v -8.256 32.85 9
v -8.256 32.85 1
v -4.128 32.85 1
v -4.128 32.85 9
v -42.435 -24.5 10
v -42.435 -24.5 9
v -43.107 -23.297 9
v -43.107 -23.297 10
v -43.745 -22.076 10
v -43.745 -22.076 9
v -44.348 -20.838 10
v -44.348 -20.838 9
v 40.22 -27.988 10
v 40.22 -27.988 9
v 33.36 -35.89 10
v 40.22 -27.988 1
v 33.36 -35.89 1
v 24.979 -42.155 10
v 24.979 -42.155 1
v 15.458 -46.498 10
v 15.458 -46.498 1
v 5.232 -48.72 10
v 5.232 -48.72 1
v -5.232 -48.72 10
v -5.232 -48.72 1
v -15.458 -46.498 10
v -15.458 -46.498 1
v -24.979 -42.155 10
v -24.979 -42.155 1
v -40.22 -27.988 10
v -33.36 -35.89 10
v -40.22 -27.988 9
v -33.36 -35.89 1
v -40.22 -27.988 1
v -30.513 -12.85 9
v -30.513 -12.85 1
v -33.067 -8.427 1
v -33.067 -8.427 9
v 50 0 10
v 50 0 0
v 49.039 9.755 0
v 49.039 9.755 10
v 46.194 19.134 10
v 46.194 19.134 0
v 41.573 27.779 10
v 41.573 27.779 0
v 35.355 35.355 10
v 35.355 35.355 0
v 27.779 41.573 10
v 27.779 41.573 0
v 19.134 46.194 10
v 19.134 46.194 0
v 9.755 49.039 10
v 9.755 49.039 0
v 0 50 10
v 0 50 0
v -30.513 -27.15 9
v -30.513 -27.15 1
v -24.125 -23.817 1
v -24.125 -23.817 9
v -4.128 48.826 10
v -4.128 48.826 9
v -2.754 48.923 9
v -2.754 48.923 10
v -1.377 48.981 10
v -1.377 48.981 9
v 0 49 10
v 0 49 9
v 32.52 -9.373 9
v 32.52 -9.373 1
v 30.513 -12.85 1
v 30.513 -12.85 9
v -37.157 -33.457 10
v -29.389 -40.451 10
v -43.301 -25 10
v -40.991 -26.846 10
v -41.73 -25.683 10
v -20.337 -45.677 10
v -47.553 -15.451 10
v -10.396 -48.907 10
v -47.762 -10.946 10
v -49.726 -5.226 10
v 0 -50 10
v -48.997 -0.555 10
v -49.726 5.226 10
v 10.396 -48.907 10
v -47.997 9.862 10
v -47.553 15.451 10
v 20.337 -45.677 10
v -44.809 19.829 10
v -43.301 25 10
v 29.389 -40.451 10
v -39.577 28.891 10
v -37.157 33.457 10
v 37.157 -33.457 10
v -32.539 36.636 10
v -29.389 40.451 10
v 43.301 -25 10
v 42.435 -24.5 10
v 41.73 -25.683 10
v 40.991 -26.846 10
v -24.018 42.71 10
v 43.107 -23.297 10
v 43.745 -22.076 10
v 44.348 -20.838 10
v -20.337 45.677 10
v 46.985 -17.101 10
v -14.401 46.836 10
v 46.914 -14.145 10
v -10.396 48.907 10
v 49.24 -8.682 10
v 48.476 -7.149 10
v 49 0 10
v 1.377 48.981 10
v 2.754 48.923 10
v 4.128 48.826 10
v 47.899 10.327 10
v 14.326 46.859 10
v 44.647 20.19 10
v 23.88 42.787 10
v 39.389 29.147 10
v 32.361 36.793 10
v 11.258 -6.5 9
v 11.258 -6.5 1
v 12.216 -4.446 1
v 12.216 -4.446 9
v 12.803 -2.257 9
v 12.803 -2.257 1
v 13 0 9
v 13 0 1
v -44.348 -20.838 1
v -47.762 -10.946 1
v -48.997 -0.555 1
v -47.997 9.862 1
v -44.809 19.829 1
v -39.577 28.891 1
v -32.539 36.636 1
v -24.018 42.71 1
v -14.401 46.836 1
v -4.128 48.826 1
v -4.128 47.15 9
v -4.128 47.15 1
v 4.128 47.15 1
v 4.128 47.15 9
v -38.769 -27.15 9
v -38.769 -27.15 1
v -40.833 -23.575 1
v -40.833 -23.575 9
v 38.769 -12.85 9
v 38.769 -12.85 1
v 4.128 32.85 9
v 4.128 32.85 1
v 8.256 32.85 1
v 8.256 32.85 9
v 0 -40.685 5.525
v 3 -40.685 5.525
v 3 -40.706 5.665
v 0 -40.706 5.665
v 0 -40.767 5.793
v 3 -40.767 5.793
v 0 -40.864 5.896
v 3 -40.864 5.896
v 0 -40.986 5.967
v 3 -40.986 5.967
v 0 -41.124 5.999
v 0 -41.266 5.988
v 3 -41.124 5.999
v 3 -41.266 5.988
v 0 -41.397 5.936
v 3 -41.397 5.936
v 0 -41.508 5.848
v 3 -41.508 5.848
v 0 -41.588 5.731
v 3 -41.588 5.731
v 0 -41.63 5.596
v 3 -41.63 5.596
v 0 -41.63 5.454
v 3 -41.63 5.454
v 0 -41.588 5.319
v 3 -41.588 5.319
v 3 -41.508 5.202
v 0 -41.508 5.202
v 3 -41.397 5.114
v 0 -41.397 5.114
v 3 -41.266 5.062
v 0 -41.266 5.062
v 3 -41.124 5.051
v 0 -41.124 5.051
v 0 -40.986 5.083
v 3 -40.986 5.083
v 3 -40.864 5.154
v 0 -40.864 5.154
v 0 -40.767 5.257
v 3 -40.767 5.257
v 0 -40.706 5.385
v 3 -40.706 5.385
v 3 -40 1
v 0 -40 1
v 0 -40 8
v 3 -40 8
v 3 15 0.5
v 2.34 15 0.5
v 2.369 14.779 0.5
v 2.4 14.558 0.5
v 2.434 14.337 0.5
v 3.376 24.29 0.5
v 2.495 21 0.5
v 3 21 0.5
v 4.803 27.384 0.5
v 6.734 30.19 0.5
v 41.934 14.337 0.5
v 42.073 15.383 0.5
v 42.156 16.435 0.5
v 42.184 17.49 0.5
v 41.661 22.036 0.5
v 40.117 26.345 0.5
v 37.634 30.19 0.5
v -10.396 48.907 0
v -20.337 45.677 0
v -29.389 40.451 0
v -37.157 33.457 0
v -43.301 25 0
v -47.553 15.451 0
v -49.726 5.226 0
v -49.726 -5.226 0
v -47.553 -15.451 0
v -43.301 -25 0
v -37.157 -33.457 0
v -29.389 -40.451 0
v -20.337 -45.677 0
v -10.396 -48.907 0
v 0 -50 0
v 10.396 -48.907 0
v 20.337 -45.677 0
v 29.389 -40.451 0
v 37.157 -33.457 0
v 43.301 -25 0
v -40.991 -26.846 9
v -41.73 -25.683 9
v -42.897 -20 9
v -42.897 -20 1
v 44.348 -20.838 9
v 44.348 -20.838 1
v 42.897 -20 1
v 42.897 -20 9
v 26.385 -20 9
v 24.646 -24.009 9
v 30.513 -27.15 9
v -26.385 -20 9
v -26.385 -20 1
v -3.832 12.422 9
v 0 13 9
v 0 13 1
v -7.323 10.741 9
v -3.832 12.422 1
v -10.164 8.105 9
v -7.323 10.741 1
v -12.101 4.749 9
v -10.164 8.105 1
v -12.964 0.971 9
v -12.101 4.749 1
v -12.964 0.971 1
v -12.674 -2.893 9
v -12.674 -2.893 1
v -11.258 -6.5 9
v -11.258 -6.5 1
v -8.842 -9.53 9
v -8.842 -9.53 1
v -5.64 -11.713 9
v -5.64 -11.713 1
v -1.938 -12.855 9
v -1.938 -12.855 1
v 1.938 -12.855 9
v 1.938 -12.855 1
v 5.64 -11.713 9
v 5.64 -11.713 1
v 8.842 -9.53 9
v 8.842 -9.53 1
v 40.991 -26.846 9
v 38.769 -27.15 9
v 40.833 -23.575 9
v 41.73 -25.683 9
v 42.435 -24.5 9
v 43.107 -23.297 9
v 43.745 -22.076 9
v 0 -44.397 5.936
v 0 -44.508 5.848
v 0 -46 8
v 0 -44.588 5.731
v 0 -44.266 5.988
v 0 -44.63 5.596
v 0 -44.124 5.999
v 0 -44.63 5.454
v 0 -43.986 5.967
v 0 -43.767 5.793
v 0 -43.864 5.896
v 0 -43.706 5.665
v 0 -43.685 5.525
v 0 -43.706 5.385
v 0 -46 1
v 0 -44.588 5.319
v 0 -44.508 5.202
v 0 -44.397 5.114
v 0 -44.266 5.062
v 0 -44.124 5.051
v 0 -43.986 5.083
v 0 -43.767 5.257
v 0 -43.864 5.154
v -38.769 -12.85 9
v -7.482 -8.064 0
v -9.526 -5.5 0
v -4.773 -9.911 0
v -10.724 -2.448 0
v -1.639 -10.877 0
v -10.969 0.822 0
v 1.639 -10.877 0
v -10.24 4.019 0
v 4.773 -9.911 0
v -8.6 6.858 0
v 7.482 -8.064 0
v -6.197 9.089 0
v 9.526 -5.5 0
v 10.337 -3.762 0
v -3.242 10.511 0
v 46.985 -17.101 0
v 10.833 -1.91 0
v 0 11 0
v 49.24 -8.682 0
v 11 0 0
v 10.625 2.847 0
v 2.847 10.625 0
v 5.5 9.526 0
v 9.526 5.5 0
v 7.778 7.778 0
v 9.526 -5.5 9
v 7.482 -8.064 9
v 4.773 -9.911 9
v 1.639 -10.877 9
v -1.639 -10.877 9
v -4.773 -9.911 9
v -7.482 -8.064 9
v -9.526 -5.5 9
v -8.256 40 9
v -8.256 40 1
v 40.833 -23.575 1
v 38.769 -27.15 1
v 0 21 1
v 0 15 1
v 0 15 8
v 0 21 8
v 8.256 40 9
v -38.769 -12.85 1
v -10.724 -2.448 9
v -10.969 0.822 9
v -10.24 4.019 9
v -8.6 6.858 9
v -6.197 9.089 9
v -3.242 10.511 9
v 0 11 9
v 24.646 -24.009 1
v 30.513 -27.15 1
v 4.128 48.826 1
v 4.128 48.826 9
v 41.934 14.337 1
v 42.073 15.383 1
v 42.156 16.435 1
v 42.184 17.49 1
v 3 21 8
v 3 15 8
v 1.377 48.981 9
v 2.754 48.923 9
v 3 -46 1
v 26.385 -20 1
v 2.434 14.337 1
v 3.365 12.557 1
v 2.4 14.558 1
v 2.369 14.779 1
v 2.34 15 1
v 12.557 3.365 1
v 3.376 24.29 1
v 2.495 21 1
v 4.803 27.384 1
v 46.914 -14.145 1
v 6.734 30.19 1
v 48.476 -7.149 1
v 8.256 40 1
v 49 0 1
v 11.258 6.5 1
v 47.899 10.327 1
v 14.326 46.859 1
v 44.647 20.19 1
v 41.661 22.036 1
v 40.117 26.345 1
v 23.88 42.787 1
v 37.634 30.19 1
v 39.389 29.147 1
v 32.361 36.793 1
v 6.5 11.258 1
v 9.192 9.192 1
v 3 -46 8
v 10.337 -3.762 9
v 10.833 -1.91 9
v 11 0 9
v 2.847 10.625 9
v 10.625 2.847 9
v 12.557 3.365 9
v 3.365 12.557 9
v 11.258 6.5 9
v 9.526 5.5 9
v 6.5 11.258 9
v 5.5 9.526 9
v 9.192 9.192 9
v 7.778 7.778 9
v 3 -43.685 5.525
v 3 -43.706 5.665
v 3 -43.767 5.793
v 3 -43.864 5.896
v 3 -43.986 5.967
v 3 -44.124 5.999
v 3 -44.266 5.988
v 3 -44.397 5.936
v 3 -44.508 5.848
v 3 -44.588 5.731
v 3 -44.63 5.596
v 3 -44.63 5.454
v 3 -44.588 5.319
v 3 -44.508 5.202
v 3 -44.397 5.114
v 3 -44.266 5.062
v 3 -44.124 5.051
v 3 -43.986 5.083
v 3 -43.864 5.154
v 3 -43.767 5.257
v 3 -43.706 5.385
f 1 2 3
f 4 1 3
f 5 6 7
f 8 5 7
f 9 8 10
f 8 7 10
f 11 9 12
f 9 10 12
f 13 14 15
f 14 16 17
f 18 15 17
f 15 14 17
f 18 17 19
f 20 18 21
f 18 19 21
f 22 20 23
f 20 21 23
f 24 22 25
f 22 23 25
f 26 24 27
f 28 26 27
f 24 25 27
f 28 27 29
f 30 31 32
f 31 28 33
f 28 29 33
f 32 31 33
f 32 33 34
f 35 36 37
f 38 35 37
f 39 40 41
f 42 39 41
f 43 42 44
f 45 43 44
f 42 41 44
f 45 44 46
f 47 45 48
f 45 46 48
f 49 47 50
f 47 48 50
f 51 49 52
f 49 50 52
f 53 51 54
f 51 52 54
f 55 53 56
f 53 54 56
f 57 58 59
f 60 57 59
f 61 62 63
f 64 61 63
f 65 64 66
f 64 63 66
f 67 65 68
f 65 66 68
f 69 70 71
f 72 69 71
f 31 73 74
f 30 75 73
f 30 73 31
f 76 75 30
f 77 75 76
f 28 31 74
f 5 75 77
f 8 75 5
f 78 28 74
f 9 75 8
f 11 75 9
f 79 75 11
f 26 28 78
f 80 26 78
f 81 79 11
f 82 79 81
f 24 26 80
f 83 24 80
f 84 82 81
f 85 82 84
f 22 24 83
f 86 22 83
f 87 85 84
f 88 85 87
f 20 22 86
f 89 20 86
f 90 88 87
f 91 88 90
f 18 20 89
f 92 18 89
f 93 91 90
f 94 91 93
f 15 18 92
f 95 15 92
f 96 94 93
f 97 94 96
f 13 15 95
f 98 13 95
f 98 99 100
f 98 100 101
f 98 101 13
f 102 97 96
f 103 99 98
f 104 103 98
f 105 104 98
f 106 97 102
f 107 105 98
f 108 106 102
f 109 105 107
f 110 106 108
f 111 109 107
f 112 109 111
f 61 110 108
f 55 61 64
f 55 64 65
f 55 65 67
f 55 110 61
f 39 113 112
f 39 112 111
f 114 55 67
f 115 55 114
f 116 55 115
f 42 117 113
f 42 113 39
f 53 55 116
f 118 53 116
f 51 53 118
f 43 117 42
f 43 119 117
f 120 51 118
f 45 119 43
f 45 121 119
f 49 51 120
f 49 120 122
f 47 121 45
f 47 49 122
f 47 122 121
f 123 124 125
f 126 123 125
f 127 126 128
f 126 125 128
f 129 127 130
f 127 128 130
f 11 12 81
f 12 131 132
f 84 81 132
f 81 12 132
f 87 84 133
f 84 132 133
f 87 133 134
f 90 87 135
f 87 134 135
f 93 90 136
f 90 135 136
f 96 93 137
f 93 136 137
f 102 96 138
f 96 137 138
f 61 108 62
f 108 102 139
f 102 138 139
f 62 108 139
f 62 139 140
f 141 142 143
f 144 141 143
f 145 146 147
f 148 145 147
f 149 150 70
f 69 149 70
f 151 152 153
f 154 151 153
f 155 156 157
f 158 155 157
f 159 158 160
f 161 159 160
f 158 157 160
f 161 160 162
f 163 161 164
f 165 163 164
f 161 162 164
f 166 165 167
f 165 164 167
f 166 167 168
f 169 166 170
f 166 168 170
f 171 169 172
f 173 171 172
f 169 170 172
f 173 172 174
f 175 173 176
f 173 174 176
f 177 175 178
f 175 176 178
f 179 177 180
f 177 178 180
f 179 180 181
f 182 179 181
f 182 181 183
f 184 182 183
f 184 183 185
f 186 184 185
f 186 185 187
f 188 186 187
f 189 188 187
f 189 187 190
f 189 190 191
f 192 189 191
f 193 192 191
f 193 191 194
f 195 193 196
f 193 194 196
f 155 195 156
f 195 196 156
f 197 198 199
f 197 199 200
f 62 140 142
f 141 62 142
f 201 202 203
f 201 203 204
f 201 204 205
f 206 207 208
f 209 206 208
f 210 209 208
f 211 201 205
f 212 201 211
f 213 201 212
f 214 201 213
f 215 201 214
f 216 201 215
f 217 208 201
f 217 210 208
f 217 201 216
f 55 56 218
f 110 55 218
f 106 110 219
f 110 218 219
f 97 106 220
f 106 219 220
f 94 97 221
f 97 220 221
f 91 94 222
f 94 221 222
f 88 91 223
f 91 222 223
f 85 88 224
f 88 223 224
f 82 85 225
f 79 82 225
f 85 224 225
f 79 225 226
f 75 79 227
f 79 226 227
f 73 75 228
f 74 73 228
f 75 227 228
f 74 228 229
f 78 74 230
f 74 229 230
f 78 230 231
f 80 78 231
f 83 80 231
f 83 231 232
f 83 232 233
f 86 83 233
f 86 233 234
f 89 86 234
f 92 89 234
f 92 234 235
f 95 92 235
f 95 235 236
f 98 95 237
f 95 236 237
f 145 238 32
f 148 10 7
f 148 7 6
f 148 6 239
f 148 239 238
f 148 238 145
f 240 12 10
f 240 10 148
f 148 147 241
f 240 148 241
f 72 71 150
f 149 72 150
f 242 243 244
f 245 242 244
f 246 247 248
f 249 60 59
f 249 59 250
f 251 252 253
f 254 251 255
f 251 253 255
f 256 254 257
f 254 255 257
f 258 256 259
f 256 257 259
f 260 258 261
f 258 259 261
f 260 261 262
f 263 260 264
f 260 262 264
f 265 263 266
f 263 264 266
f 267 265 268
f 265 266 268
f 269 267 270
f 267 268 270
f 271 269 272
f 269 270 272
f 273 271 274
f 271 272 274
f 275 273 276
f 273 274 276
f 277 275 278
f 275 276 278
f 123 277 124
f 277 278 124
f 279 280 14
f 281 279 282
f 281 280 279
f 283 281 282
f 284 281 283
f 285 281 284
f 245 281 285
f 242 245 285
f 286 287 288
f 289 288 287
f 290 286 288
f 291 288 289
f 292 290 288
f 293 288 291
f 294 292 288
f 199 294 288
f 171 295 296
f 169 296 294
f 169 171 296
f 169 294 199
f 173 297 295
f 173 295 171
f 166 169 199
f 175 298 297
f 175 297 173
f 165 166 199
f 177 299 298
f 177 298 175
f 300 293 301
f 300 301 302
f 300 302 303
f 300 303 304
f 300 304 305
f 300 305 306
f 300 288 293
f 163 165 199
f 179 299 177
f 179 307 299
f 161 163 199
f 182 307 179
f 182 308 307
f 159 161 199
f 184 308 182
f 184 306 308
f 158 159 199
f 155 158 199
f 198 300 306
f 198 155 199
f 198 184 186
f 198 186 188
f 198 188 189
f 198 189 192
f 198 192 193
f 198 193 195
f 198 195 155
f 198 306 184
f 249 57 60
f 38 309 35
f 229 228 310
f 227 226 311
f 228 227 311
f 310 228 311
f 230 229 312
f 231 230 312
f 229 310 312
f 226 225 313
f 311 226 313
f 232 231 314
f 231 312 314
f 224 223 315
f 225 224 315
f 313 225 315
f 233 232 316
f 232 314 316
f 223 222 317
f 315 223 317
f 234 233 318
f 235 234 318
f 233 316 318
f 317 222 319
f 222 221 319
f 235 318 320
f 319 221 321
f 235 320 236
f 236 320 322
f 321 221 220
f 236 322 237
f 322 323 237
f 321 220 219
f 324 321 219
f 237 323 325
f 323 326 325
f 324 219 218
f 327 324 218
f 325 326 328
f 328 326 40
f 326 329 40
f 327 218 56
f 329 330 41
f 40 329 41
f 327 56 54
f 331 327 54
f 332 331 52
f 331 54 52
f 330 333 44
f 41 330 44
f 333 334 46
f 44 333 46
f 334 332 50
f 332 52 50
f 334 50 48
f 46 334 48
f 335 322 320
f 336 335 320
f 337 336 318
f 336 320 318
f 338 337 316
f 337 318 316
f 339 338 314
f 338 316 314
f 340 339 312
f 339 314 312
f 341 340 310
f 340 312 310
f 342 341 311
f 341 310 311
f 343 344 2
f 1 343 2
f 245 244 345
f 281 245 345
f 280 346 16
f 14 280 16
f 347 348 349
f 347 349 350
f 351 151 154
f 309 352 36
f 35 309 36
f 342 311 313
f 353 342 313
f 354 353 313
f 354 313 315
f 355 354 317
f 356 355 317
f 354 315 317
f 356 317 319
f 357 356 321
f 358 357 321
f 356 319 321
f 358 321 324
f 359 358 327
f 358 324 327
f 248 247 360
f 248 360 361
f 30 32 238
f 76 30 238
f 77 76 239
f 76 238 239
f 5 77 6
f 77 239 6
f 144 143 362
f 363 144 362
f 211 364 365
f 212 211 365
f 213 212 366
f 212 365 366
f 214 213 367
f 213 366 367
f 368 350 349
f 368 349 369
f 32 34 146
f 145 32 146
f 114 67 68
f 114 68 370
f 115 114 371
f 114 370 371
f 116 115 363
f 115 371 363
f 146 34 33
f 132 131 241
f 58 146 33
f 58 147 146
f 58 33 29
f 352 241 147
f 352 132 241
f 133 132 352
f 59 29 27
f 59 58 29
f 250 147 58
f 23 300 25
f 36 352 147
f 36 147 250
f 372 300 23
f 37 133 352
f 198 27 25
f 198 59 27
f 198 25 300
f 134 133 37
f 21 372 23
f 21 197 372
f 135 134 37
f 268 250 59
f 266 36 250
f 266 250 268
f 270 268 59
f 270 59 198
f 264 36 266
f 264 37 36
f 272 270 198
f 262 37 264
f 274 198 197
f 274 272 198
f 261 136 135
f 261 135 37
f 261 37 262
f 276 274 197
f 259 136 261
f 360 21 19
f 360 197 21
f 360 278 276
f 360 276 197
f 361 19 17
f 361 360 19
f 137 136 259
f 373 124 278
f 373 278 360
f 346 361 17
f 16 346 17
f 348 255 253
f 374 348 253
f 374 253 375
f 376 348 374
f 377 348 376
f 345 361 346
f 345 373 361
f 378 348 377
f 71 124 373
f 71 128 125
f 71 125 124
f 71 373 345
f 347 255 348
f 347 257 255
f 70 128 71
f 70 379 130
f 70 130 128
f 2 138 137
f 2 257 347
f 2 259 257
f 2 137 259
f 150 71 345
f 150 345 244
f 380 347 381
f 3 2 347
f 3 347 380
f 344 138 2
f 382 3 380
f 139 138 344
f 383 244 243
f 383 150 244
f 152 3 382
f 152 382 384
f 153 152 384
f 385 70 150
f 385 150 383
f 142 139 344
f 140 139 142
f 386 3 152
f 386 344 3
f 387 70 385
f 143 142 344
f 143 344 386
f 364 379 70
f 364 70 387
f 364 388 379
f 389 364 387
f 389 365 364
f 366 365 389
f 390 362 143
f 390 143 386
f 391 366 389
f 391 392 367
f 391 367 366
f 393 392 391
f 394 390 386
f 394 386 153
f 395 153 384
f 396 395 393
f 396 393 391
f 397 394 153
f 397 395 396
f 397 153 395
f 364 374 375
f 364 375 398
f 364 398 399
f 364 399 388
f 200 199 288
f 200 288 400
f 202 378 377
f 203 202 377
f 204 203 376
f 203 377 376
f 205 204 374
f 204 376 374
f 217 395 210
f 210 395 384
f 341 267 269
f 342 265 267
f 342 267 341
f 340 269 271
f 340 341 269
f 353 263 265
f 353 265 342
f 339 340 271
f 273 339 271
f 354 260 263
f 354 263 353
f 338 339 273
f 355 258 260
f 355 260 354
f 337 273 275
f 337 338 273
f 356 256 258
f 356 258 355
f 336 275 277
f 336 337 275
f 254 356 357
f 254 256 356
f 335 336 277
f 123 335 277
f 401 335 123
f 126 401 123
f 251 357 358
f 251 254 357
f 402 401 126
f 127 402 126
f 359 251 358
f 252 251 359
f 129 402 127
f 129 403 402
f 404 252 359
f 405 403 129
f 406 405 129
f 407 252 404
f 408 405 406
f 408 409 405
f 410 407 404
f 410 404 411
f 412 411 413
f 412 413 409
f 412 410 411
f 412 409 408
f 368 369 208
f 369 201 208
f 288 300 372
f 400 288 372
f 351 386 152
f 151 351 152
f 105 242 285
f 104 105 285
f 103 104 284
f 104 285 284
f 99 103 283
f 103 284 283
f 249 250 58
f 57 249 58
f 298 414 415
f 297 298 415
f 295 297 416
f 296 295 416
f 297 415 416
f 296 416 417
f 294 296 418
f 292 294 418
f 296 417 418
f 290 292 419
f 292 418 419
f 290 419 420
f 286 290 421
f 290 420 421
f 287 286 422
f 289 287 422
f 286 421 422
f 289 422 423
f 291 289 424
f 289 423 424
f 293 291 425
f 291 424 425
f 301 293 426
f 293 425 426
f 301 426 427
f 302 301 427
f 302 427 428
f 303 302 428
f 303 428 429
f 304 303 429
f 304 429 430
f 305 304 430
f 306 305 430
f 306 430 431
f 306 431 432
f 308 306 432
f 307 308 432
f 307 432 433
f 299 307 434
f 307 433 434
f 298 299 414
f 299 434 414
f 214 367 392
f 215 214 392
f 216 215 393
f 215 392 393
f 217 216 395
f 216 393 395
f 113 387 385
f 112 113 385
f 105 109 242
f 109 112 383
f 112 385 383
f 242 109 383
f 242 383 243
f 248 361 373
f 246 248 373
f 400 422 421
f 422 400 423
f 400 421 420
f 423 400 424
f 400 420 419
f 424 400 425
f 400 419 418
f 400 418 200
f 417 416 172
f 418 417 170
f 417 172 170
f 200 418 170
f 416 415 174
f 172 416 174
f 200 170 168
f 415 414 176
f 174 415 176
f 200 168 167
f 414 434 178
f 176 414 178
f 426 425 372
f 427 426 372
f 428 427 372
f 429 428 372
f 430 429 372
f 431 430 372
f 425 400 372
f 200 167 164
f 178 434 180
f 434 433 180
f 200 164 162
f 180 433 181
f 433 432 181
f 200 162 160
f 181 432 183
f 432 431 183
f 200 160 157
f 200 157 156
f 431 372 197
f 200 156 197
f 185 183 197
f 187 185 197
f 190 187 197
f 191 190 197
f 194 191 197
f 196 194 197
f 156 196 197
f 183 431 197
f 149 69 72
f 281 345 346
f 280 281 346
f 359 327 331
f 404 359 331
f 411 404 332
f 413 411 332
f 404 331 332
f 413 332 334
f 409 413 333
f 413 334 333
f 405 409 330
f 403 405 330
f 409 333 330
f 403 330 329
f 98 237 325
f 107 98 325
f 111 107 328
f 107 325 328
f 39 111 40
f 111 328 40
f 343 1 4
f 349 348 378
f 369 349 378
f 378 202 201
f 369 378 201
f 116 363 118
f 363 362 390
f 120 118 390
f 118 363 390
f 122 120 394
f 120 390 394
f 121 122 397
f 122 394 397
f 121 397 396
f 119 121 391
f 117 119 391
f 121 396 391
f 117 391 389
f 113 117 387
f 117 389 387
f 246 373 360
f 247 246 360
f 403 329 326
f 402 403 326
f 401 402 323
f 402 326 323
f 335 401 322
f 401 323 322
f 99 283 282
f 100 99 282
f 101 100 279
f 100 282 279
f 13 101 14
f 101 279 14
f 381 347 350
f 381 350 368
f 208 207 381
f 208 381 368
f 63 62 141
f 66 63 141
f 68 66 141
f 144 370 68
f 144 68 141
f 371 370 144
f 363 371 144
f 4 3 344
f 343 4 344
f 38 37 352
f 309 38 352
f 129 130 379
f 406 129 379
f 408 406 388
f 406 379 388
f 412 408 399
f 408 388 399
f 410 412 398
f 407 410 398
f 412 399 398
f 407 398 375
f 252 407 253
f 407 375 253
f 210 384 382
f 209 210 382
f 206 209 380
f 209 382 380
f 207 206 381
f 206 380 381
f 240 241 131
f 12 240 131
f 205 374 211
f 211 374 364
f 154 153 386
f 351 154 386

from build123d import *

# Parameters (mm, degrees)
F1_DEPTH  = 10
F2_DEPTH  = 1
F3_DEPTH  = 9
F4_W      = 3
F4_H      = 6
F5_DEPTH  = 7
F7_R      = 0.475
F6_R      = 0.475
F8_DEPTH  = 3
F10_DEPTH = 0.5


with BuildPart() as f1:
    # F0 (on Top) → F1 (new body)
    with BuildSketch(Plane.XY):
        with BuildLine():
            ThreePointArc((-4.1280544247, 48.8258043115), (-2.0658640729, 48.9564317085), (0, 49))
            Line((0, 49), (0, 50))
            ThreePointArc((0, 50), (-43.3012701892, 25), (-43.3012701892, -25))
            Line((-43.3012701892, -25), (-42.4352447854, -24.5))
            ThreePointArc((-42.4352447854, -24.5), (-43.4304455747, -22.6891250863), (-44.3484141063, -20.8379021558))
            ThreePointArc((-44.3484141063, -20.8379021558), (-42.4352447854, 24.5), (-4.1280544247, 48.8258043115))
        make_face()
        with BuildLine():
            Line((43.3012701892, -25), (42.4352447854, -24.5))
            ThreePointArc((42.4352447854, -24.5), (41.3645815018, -26.2673066222), (40.2203596816, -27.9879021558))
            ThreePointArc((40.2203596816, -27.9879021558), (0, -49), (-40.2203596816, -27.9879021558))
            ThreePointArc((-40.2203596816, -27.9879021558), (-41.3645815018, -26.2673066222), (-42.4352447854, -24.5))
            Line((-42.4352447854, -24.5), (-43.3012701892, -25))
            ThreePointArc((-43.3012701892, -25), (0, -50), (43.3012701892, -25))
        make_face()
        with BuildLine():
            Line((0, 50), (0, 49))
            ThreePointArc((0, 49), (2.0658640729, 48.9564317085), (4.1280544247, 48.8258043115))
            ThreePointArc((4.1280544247, 48.8258043115), (36.0782113388, 33.1566383488), (49, 0))
            ThreePointArc((49, 0), (47.8229667169, -10.6753854448), (44.3484141063, -20.8379021558))
            ThreePointArc((44.3484141063, -20.8379021558), (43.4304455747, -22.6891250863), (42.4352447854, -24.5))
            Line((42.4352447854, -24.5), (43.3012701892, -25))
            ThreePointArc((43.3012701892, -25), (48.2962913145, -12.9409522551), (50, 0))
            ThreePointArc((50, 0), (35.3553390593, 35.3553390593), (0, 50))
        make_face()
    extrude(amount=F1_DEPTH)

    # F0 (on Top) → F2 (join)
    with BuildSketch(Plane.XY):
        with BuildLine():
            ThreePointArc((-11.2583302492, -6.5), (-11.2583302492, 6.5), (0, 13))
            Line((0, 13), (0, 32.85))
            Line((0, 32.85), (-4.1280544247, 32.85))
            Line((-4.1280544247, 32.85), (-8.2561088494, 32.85))
            Line((-8.2561088494, 32.85), (-8.2561088494, 40))
            Line((-8.2561088494, 40), (-4.1280544247, 47.15))
            Line((-4.1280544247, 47.15), (-4.1280544247, 48.8258043115))
            ThreePointArc((-4.1280544247, 48.8258043115), (-42.4352447854, 24.5), (-44.3484141063, -20.8379021558))
            Line((-44.3484141063, -20.8379021558), (-42.8971250008, -20))
            Line((-42.8971250008, -20), (-38.7690705761, -12.85))
            Line((-38.7690705761, -12.85), (-33.0666268225, -8.4269223086))
            Line((-33.0666268225, -8.4269223086), (-30.5129617267, -12.85))
            Line((-30.5129617267, -12.85), (-28.4489345143, -16.425))
            Line((-28.4489345143, -16.425), (-11.2583302492, -6.5))
        make_face()
        with BuildLine():
            Line((28.4489345143, -16.425), (11.2583302492, -6.5))
            ThreePointArc((11.2583302492, -6.5), (0, -13), (-11.2583302492, -6.5))
            Line((-11.2583302492, -6.5), (-28.4489345143, -16.425))
            Line((-28.4489345143, -16.425), (-26.384907302, -20))
            Line((-26.384907302, -20), (-24.1253543645, -23.8167438656))
            Line((-24.1253543645, -23.8167438656), (-30.5129617267, -27.15))
            Line((-30.5129617267, -27.15), (-38.7690705761, -27.15))
            Line((-38.7690705761, -27.15), (-40.2203596816, -27.9879021558))
            ThreePointArc((-40.2203596816, -27.9879021558), (0, -49), (40.2203596816, -27.9879021558))
            Line((40.2203596816, -27.9879021558), (38.7690705761, -27.15))
            Line((38.7690705761, -27.15), (30.5129617267, -27.15))
            Line((30.5129617267, -27.15), (24.6460232884, -24.0091364831))
            Line((24.6460232884, -24.0091364831), (26.384907302, -20))
            Line((26.384907302, -20), (28.4489345143, -16.425))
        make_face()
        with BuildLine():
            Line((0, 32.85), (0, 13))
            ThreePointArc((0, 13), (9.1923881554, 9.1923881554), (13, 0))
            ThreePointArc((13, 0), (12.5570357418, -3.3646475863), (11.2583302492, -6.5))
            Line((11.2583302492, -6.5), (28.4489345143, -16.425))
            Line((28.4489345143, -16.425), (30.5129617267, -12.85))
            Line((30.5129617267, -12.85), (32.5203803987, -9.3730488681))
            Line((32.5203803987, -9.3730488681), (38.7690705761, -12.85))
            Line((38.7690705761, -12.85), (42.8971250008, -20))
            Line((42.8971250008, -20), (44.3484141063, -20.8379021558))
            ThreePointArc((44.3484141063, -20.8379021558), (47.8229667169, -10.6753854448), (49, 0))
            ThreePointArc((49, 0), (36.0782113388, 33.1566383488), (4.1280544247, 48.8258043115))
            Line((4.1280544247, 48.8258043115), (4.1280544247, 47.15))
            Line((4.1280544247, 47.15), (8.2561088494, 40))
            Line((8.2561088494, 40), (8.2561088494, 32.85))
            Line((8.2561088494, 32.85), (4.1280544247, 32.85))
            Line((4.1280544247, 32.85), (0, 32.85))
        make_face()
        Polygon((-40.8330977884, -23.575), (-28.4489345143, -16.425), (-30.5129617267, -12.85), (-38.7690705761, -12.85), (-42.8971250008, -20), align=None)
        Polygon((-26.384907302, -20), (-28.4489345143, -16.425), (-40.8330977884, -23.575), (-38.7690705761, -27.15), (-30.5129617267, -27.15), align=None)
        Polygon((30.5129617267, -12.85), (28.4489345143, -16.425), (40.8330977884, -23.575), (42.8971250008, -20), (38.7690705761, -12.85), align=None)
        Polygon((40.8330977884, -23.575), (28.4489345143, -16.425), (26.384907302, -20), (30.5129617267, -27.15), (38.7690705761, -27.15), align=None)
        Polygon((0, 47.15), (0, 32.85), (4.1280544247, 32.85), (8.2561088494, 40), (4.1280544247, 47.15), align=None)
        Polygon((-4.1280544247, 32.85), (0, 32.85), (0, 47.15), (-4.1280544247, 47.15), (-8.2561088494, 40), align=None)
    extrude(amount=F2_DEPTH)

    # F0 (on Top) → F3 (join)
    with BuildSketch(Plane.XY):
        with BuildLine():
            ThreePointArc((-9.5262794416, -5.5), (-9.5262794416, 5.5), (0, 11))
            Line((0, 11), (0, 13))
            ThreePointArc((0, 13), (-11.2583302492, 6.5), (-11.2583302492, -6.5))
            Line((-11.2583302492, -6.5), (-9.5262794416, -5.5))
        make_face()
        with BuildLine():
            Line((11.2583302492, -6.5), (9.5262794416, -5.5))
            ThreePointArc((9.5262794416, -5.5), (0, -11), (-9.5262794416, -5.5))
            Line((-9.5262794416, -5.5), (-11.2583302492, -6.5))
            ThreePointArc((-11.2583302492, -6.5), (0, -13), (11.2583302492, -6.5))
        make_face()
        with BuildLine():
            ThreePointArc((0, 11), (7.7781745931, 7.7781745931), (11, 0))
            ThreePointArc((11, 0), (10.6251840892, -2.8470094961), (9.5262794416, -5.5))
            Line((9.5262794416, -5.5), (11.2583302492, -6.5))
            ThreePointArc((11.2583302492, -6.5), (12.5570357418, -3.3646475863), (13, 0))
            ThreePointArc((13, 0), (9.1923881554, 9.1923881554), (0, 13))
            Line((0, 13), (0, 11))
        make_face()
        Polygon((-24.1253543645, -23.8167438656), (-26.384907302, -20), (-30.5129617267, -27.15), align=None)
        with BuildLine():
            Line((-38.7690705761, -27.15), (-40.8330977884, -23.575))
            Line((-40.8330977884, -23.575), (-42.4352447854, -24.5))
            ThreePointArc((-42.4352447854, -24.5), (-41.3645815018, -26.2673066222), (-40.2203596816, -27.9879021558))
            Line((-40.2203596816, -27.9879021558), (-38.7690705761, -27.15))
        make_face()
        with BuildLine():
            Line((-42.4352447854, -24.5), (-40.8330977884, -23.575))
            Line((-40.8330977884, -23.575), (-42.8971250008, -20))
            Line((-42.8971250008, -20), (-44.3484141063, -20.8379021558))
            ThreePointArc((-44.3484141063, -20.8379021558), (-43.4304455747, -22.6891250863), (-42.4352447854, -24.5))
        make_face()
        Polygon((-38.7690705761, -12.85), (-30.5129617267, -12.85), (-33.0666268225, -8.4269223086), align=None)
        Polygon((8.2561088494, 40), (4.1280544247, 32.85), (8.2561088494, 32.85), align=None)
        Polygon((-8.2561088494, 32.85), (-4.1280544247, 32.85), (-8.2561088494, 40), align=None)
        with BuildLine():
            Line((0, 49), (0, 47.15))
            Line((0, 47.15), (4.1280544247, 47.15))
            Line((4.1280544247, 47.15), (4.1280544247, 48.8258043115))
            ThreePointArc((4.1280544247, 48.8258043115), (2.0658640729, 48.9564317085), (0, 49))
        make_face()
        with BuildLine():
            Line((-4.1280544247, 47.15), (0, 47.15))
            Line((0, 47.15), (0, 49))
            ThreePointArc((0, 49), (-2.0658640729, 48.9564317085), (-4.1280544247, 48.8258043115))
            Line((-4.1280544247, 48.8258043115), (-4.1280544247, 47.15))
        make_face()
        Polygon((30.5129617267, -27.15), (26.384907302, -20), (24.6460232884, -24.0091364831), align=None)
        Polygon((32.5203803987, -9.3730488681), (30.5129617267, -12.85), (38.7690705761, -12.85), align=None)
        with BuildLine():
            Line((42.8971250008, -20), (40.8330977884, -23.575))
            Line((40.8330977884, -23.575), (42.4352447854, -24.5))
            ThreePointArc((42.4352447854, -24.5), (43.4304455747, -22.6891250863), (44.3484141063, -20.8379021558))
            Line((44.3484141063, -20.8379021558), (42.8971250008, -20))
        make_face()
        with BuildLine():
            Line((42.4352447854, -24.5), (40.8330977884, -23.575))
            Line((40.8330977884, -23.575), (38.7690705761, -27.15))
            Line((38.7690705761, -27.15), (40.2203596816, -27.9879021558))
            ThreePointArc((40.2203596816, -27.9879021558), (41.3645815018, -26.2673066222), (42.4352447854, -24.5))
        make_face()
    extrude(amount=F3_DEPTH)

    # F4 (on face) → F5 (join)
    with BuildSketch(Plane.XY.offset(1)):
        with Locations((1.5, -43)):
            Rectangle(F4_W, F4_H)
        with Locations((1.5, 18)):
            Rectangle(F4_W, F4_H)
    extrude(amount=F5_DEPTH)

    # F7 (on face) + F6 (on face) → F8 (cut)
    with BuildSketch(Plane.YZ.offset(3)):
        with Locations((26.4671016484, 6.5815430135)):
            Circle(F7_R)
        with Locations((29.4671016484, 6.5815430135)):
            Circle(F7_R)
    with BuildSketch(Plane.YZ.offset(3)):
        with Locations((-44.1599413753, 5.525)):
            Circle(F6_R)
        with Locations((-41.1599413753, 5.525)):
            Circle(F6_R)
    extrude(amount=-F8_DEPTH, mode=Mode.SUBTRACT)

    # F9 (on face) → F10 (cut)
    with BuildSketch(Plane.XY.offset(1)):
        with BuildLine():
            Line((6.7339187528, 28.548197319), (37.6344041859, 28.548197319))
            ThreePointArc((37.6344041859, 28.548197319), (36.9979768258, 29.3872318901), (36.3160403253, 30.1897164106))
            Line((36.3160403253, 30.1897164106), (8.0522826134, 30.1897164106))
            ThreePointArc((8.0522826134, 30.1897164106), (7.3703461129, 29.3872318901), (6.7339187528, 28.548197319))
        make_face()
        with BuildLine():
            ThreePointArc((37.6344041859, 28.548197319), (40.2749686876, 23.2968408447), (41.1841614693, 17.4897164106))
            ThreePointArc((41.1841614693, 17.4897164106), (41.1704659003, 16.7684369526), (41.1293989371, 16.048197319))
            ThreePointArc((41.1293989371, 16.048197319), (41.0445206049, 15.1904005824), (40.9208233919, 14.3373363574))
            Line((40.9208233919, 14.3373363574), (41.9341614693, 14.3373363574))
            ThreePointArc((41.9341614693, 14.3373363574), (42.1215635067, 15.9085775806), (42.1841614693, 17.4897164106))
            ThreePointArc((42.1841614693, 17.4897164106), (41.0123963087, 24.2349052764), (37.6344041859, 30.1897164106))
            Line((37.6344041859, 30.1897164106), (36.3160403253, 30.1897164106))
            ThreePointArc((36.3160403253, 30.1897164106), (36.9979768258, 29.3872318901), (37.6344041859, 28.548197319))
        make_face()
        with BuildLine():
            ThreePointArc((40.9208233919, 14.3373363574), (41.0445206049, 15.1904005824), (41.1293989371, 16.048197319))
            Line((41.1293989371, 16.048197319), (3.2389240016, 16.048197319))
            ThreePointArc((3.2389240016, 16.048197319), (3.3238023338, 15.1904005824), (3.4474995468, 14.3373363574))
            Line((3.4474995468, 14.3373363574), (40.9208233919, 14.3373363574))
        make_face()
        with BuildLine():
            ThreePointArc((3.2389240016, 16.048197319), (3.885943953, 22.6058903447), (6.7339187528, 28.548197319))
            ThreePointArc((6.7339187528, 28.548197319), (7.3703461129, 29.3872318901), (8.0522826134, 30.1897164106))
            Line((8.0522826134, 30.1897164106), (6.7339187528, 30.1897164106))
            ThreePointArc((6.7339187528, 30.1897164106), (4.0233858738, 25.867438641), (2.4946234066, 21))
            Line((2.4946234066, 21), (3, 21))
            Line((3, 21), (3, 15))
            Line((3, 15), (2.3397337327, 15))
            ThreePointArc((2.3397337327, 15), (2.3841751632, 14.668273114), (2.4341614693, 14.3373363574))
            Line((2.4341614693, 14.3373363574), (3.4474995468, 14.3373363574))
            ThreePointArc((3.4474995468, 14.3373363574), (3.3238023338, 15.1904005824), (3.2389240016, 16.048197319))
        make_face()
        with BuildLine():
            ThreePointArc((41.1293989371, 16.048197319), (41.1704659003, 16.7684369526), (41.1841614693, 17.4897164106))
            ThreePointArc((41.1841614693, 17.4897164106), (40.2749686876, 23.2968408447), (37.6344041859, 28.548197319))
            Line((37.6344041859, 28.548197319), (6.7339187528, 28.548197319))
            ThreePointArc((6.7339187528, 28.548197319), (3.885943953, 22.6058903447), (3.2389240016, 16.048197319))
            Line((3.2389240016, 16.048197319), (41.1293989371, 16.048197319))
        make_face()
    extrude(amount=-F10_DEPTH, mode=Mode.SUBTRACT)


solid = f1.part
